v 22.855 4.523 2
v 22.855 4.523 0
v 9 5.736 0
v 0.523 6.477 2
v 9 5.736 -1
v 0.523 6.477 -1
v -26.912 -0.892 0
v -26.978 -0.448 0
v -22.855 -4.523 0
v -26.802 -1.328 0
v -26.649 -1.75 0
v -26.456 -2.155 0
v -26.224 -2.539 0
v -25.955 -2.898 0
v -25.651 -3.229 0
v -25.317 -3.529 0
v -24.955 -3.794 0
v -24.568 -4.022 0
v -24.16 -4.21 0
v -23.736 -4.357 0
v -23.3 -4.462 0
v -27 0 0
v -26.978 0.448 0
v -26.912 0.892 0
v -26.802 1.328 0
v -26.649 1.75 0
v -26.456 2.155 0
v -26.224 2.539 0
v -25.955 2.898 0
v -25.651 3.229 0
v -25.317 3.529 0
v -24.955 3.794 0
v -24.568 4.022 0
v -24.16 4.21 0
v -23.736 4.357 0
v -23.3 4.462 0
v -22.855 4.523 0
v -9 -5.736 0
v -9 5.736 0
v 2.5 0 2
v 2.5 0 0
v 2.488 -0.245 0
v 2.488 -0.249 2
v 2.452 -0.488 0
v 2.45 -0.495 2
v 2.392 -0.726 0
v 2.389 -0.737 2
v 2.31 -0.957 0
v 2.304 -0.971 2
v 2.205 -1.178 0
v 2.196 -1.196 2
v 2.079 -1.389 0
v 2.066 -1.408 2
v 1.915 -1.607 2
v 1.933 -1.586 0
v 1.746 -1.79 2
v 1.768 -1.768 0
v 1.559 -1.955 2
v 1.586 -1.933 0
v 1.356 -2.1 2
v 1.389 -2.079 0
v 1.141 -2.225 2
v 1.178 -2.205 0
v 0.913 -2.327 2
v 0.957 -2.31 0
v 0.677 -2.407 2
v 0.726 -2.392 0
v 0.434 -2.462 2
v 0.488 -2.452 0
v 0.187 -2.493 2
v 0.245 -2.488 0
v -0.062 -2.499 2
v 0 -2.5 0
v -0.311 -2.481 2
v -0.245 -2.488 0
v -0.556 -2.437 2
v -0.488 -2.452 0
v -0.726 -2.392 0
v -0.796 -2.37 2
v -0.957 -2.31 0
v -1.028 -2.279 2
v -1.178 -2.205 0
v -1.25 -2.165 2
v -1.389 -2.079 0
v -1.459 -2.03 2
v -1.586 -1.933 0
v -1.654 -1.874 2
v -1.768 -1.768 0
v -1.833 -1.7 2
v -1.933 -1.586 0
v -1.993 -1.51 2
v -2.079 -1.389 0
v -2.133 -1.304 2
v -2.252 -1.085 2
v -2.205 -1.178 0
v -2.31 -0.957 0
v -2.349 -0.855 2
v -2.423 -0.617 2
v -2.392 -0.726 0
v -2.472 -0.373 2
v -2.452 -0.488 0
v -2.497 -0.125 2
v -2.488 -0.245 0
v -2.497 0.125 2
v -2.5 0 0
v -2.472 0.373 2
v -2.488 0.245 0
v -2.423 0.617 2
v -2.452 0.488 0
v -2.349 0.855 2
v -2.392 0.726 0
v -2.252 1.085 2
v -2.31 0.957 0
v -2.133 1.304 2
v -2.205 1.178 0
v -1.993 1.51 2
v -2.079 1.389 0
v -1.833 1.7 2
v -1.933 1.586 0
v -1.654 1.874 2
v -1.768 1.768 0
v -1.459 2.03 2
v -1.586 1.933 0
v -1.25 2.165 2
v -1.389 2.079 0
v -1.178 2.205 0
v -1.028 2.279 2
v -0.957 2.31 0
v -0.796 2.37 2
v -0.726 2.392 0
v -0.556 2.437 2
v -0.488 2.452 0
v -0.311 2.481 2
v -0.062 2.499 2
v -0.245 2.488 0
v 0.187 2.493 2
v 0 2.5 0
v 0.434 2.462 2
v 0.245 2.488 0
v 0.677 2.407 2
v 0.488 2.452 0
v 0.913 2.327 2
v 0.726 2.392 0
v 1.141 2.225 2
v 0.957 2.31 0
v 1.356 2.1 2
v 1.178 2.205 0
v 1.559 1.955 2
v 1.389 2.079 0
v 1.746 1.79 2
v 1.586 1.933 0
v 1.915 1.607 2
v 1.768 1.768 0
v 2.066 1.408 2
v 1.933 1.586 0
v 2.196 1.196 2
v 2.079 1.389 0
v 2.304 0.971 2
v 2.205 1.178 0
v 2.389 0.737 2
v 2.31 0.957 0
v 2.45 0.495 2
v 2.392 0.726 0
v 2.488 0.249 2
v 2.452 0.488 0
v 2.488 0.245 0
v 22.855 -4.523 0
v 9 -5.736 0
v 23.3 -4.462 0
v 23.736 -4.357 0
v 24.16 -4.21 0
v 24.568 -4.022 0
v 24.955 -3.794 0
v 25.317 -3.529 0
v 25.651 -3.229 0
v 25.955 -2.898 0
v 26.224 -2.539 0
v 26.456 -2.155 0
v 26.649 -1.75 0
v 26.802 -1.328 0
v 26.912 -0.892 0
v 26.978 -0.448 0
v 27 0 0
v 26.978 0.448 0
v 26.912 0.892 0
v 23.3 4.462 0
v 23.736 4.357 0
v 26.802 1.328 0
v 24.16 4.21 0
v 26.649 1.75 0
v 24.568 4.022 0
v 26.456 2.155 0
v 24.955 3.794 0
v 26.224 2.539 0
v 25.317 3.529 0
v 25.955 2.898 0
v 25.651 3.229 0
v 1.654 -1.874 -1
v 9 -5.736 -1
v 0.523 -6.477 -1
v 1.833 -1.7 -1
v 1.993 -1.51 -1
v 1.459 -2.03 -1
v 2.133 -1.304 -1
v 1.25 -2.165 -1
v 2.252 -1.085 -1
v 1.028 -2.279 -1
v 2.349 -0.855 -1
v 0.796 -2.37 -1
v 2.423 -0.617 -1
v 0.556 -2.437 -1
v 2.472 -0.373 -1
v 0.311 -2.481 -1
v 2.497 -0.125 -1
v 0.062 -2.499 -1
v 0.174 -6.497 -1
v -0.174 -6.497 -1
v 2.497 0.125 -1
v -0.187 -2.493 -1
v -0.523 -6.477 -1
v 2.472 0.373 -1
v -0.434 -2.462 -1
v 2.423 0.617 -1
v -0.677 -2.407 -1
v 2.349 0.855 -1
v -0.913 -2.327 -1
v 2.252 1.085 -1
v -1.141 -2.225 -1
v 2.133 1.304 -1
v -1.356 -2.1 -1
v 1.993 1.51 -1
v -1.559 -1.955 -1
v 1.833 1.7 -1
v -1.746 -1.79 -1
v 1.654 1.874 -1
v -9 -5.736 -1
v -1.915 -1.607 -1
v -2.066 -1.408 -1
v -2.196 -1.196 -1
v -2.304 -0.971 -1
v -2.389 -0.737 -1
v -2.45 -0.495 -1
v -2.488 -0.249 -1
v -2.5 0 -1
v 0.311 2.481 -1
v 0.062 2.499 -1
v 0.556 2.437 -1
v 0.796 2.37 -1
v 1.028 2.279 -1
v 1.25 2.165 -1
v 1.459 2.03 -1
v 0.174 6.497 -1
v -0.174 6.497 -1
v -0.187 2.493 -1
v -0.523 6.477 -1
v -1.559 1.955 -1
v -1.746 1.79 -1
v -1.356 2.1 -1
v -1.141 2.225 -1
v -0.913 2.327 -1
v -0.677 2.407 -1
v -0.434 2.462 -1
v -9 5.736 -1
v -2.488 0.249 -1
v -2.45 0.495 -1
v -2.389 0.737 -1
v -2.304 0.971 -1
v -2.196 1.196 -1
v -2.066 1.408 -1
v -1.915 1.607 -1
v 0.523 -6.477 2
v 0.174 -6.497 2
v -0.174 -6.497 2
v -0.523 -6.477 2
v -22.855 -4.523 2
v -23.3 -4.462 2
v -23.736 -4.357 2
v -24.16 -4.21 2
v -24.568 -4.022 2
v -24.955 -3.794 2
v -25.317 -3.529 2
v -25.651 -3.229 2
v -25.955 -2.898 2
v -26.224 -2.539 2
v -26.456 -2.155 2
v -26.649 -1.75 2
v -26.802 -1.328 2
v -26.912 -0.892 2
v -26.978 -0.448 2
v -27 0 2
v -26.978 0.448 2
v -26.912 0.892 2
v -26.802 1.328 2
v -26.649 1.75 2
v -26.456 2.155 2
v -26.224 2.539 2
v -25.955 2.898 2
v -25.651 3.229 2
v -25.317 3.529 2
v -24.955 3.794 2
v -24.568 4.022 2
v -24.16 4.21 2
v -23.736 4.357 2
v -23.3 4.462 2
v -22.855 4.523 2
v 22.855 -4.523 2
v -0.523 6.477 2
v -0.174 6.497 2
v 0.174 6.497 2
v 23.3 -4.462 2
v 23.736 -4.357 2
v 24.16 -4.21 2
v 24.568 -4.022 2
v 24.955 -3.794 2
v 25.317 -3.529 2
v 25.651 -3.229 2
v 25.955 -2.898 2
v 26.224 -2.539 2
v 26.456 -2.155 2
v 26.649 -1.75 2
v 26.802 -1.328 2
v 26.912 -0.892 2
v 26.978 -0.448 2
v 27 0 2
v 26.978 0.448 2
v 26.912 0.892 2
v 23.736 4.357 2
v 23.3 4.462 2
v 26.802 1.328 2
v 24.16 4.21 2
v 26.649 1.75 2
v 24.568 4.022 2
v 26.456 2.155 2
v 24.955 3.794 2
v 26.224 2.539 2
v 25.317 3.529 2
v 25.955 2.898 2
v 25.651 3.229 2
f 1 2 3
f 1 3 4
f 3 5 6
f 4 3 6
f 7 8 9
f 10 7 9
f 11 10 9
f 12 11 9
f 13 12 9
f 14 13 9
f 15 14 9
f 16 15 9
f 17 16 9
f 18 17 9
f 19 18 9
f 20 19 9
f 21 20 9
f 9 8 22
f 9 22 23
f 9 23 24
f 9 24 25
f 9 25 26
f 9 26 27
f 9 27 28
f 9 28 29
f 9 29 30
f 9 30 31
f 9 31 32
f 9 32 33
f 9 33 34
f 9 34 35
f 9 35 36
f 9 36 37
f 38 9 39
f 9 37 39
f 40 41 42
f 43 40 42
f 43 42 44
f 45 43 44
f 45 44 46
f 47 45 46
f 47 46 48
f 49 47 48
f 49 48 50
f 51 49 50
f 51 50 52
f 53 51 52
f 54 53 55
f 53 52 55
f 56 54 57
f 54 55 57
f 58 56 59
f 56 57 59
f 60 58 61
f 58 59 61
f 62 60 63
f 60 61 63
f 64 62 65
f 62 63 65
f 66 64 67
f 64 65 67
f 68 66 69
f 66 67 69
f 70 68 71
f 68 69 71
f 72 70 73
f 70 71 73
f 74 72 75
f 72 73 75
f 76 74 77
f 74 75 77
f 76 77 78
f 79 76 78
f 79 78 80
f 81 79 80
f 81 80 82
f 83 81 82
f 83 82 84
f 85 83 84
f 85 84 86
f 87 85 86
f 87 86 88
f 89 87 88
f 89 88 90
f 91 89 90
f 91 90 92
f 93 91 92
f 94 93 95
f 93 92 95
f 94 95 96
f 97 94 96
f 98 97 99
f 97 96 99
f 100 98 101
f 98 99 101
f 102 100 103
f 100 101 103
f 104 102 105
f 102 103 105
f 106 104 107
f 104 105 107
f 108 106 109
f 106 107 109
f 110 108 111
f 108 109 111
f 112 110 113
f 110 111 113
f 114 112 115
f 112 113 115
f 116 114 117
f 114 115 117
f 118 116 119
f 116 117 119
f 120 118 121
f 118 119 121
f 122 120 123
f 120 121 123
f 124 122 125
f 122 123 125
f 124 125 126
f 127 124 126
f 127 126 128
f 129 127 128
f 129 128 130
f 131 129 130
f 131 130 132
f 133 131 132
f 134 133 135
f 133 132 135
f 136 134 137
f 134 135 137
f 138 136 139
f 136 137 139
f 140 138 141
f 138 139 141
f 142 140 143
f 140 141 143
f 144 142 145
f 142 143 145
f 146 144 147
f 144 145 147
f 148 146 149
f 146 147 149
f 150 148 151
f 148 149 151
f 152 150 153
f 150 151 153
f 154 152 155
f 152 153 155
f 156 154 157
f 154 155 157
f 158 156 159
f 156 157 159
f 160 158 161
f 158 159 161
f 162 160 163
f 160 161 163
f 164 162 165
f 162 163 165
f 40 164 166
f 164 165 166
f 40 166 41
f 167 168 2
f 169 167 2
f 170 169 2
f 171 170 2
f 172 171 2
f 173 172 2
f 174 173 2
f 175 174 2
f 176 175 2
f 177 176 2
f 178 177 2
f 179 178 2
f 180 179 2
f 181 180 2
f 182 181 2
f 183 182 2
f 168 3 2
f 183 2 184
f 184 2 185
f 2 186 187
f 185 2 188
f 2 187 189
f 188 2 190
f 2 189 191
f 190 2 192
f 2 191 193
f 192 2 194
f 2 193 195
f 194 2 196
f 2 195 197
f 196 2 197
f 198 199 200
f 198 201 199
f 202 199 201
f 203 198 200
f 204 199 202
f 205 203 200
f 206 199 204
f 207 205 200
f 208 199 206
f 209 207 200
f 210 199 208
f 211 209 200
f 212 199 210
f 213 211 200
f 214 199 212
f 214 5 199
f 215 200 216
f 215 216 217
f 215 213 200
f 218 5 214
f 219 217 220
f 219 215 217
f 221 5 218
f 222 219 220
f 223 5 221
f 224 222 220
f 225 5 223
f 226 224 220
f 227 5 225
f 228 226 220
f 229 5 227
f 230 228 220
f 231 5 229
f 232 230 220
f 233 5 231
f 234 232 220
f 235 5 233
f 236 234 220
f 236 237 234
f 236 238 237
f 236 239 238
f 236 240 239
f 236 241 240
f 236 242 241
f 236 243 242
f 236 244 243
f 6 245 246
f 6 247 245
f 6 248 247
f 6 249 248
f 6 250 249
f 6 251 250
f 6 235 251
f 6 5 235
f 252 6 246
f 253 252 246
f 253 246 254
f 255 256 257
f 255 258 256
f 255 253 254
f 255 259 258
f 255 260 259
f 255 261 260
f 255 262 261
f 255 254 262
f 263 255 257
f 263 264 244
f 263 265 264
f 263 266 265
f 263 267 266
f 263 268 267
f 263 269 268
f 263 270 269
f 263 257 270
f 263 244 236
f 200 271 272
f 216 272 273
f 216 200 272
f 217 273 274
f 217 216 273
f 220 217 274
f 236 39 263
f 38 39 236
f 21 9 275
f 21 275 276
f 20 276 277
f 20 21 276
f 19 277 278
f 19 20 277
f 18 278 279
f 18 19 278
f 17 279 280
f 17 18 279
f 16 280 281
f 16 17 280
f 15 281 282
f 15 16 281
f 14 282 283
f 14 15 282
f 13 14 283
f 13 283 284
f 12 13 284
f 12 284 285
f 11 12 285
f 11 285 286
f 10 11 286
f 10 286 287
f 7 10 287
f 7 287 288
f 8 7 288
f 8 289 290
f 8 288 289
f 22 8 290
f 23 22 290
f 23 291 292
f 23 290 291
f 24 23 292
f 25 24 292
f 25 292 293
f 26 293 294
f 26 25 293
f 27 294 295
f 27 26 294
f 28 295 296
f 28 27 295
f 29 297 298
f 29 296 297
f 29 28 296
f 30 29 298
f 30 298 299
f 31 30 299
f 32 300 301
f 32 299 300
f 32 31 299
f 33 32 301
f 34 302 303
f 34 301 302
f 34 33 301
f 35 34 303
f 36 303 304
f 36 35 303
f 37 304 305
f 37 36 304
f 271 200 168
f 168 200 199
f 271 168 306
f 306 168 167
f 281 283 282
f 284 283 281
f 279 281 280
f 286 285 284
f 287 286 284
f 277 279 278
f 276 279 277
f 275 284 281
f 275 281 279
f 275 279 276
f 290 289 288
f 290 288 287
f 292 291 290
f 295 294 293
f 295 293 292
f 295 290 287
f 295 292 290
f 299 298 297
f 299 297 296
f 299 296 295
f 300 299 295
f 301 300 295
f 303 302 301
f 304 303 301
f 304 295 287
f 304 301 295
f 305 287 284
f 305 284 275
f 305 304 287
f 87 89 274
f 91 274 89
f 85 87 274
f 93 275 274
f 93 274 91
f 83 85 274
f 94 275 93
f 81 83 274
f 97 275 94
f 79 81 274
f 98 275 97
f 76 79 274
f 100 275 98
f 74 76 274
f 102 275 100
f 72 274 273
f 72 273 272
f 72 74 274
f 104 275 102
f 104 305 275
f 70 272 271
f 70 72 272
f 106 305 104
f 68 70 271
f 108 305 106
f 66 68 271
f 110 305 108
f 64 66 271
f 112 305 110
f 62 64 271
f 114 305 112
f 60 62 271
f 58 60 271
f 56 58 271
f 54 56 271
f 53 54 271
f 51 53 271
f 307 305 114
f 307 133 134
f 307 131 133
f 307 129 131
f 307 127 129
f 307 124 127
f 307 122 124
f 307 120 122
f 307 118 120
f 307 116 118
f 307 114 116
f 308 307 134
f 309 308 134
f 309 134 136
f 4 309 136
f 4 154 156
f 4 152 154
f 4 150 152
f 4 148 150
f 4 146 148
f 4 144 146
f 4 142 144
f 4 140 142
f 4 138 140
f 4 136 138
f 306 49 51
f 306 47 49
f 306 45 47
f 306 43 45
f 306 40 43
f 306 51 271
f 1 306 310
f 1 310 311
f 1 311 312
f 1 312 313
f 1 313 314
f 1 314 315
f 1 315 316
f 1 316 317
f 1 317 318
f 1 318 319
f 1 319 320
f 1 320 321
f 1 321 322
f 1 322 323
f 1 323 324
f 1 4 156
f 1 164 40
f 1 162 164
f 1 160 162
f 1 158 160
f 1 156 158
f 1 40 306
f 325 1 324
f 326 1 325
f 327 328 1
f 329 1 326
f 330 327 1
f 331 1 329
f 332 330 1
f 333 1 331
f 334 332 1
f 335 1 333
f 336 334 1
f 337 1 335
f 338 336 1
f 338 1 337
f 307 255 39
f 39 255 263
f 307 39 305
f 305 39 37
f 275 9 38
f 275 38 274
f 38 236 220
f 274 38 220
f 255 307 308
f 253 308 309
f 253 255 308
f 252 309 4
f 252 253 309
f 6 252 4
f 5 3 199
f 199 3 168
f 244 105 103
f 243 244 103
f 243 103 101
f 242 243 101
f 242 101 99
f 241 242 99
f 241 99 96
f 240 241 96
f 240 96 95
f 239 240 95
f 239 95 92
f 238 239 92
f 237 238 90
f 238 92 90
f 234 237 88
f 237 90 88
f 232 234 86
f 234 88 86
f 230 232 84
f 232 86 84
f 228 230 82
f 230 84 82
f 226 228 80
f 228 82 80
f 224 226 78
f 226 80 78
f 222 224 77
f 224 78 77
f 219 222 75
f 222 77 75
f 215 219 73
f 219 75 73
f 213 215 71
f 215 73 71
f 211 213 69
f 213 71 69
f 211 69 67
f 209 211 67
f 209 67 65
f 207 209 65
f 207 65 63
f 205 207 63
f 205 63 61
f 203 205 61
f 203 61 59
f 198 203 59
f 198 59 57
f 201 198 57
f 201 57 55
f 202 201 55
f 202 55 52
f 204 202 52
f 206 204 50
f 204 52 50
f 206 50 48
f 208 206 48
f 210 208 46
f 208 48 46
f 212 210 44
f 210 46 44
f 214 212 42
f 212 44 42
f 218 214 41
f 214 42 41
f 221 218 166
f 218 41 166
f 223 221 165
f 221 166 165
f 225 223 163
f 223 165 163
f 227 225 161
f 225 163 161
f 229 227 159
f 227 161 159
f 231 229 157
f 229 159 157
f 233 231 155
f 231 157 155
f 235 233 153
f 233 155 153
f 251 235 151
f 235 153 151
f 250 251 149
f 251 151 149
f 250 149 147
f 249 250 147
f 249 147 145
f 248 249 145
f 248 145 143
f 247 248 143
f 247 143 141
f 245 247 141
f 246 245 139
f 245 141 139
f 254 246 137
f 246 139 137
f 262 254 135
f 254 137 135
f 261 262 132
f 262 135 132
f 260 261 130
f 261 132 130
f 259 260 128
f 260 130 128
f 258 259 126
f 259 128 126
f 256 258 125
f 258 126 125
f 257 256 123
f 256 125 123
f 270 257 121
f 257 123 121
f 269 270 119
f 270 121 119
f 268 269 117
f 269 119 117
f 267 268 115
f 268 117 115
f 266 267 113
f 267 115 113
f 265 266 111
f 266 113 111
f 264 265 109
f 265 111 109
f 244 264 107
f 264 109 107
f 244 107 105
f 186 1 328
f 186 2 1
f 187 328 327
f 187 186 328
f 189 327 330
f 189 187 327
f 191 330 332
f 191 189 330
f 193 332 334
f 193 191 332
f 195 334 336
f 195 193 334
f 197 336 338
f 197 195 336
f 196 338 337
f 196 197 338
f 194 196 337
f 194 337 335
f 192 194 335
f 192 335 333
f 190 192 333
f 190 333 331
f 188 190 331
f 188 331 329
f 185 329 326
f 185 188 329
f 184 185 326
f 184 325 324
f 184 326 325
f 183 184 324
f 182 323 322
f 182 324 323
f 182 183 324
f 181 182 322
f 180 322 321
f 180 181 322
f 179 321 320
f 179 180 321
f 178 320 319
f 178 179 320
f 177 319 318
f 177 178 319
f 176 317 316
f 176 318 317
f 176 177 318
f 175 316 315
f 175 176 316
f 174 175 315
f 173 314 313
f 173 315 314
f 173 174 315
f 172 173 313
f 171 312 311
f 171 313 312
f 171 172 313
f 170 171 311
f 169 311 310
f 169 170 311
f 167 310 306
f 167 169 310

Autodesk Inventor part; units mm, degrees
ref_plane "YZ Plane" through (0, 0, 0) normal (1, 0, 0) x (0, 1, 0)
ref_plane "XZ Plane" through (0, 0, 0) normal (0, 1, 0) x (-1, 0, 0)
ref_plane "XY Plane" through (0, 0, 0) normal (0, 0, 1) x (1, 0, 0)
sketch "Sketch1" plane through (0, 0, 0) normal (0, 0, 1) x (1, 0, 0)
  line L0 (22.8551, 4.5234) -> (0.5229, 6.4772)
  arc A0 (0.5229, 6.4772) -> (-0.5229, 6.4772) centre (0, 0.5) ccw
  line L1 (-0.5229, 6.4772) -> (-22.8551, 4.5234)
  arc A1 (-22.8551, 4.5234) -> (-22.8551, -4.5234) centre (-22.4594, 0) ccw
  line L2 (-22.8551, -4.5234) -> (-0.5229, -6.4772)
  arc A2 (-0.5229, -6.4772) -> (0.5229, -6.4772) centre (0, -0.5) ccw
  line L3 (0.5229, -6.4772) -> (22.8551, -4.5234)
  arc A3 (22.8551, -4.5234) -> (22.8551, 4.5234) centre (22.4594, 0) ccw
  circle A4 centre (0, 0) radius 2.5
  dimension "d0" = 54
  dimension "d1" = 13
  dimension "d2" = 5
  dimension "d4" = 6
  dimension "d11" = 10
extrude "Extrusion1" add sketch "Sketch1" along normal blind 2
sketch "Sketch2" plane through (0, 0, 0) normal (0, 0, -1) x (-1, 0, 0)
  arc A0 (0.5229, 6.4772) -> (-0.5229, 6.4772) centre (0, 0.5) ccw projected
  line L0 (-22.8551, 4.5234) -> (-0.5229, 6.4772) projected
  arc A1 (-22.8551, 4.5234) -> (-22.8551, -4.5234) centre (-22.4594, 0) ccw construction
  line L1 (-0.5229, -6.4772) -> (-22.8551, -4.5234) projected
  arc A2 (-0.5229, -6.4772) -> (0.5229, -6.4772) centre (0, -0.5) ccw projected
  line L2 (22.8551, -4.5234) -> (0.5229, -6.4772) projected
  arc A3 (22.8551, -4.5234) -> (22.8551, 4.5234) centre (22.4594, 0) ccw construction
  line L3 (0.5229, 6.4772) -> (22.8551, 4.5234) projected
  circle A4 centre (0, 0) radius 2.5 projected
  line L4 (-9, 5.7355) -> (-9, -5.7355)
  line L5 (-22.8551, 4.5234) -> (-0.5229, 6.4772) construction
  line L6 (9, 5.7355) -> (9, -5.7355)
  line L7 (0.5229, 6.4772) -> (22.8551, 4.5234) construction
  point P0 (9, 5.7355)
  dimension "d7" = 18
  dimension "d8" = 9
extrude "Extrusion2" add sketch "Sketch2" along normal blind 1
properties part number "NyArm"
